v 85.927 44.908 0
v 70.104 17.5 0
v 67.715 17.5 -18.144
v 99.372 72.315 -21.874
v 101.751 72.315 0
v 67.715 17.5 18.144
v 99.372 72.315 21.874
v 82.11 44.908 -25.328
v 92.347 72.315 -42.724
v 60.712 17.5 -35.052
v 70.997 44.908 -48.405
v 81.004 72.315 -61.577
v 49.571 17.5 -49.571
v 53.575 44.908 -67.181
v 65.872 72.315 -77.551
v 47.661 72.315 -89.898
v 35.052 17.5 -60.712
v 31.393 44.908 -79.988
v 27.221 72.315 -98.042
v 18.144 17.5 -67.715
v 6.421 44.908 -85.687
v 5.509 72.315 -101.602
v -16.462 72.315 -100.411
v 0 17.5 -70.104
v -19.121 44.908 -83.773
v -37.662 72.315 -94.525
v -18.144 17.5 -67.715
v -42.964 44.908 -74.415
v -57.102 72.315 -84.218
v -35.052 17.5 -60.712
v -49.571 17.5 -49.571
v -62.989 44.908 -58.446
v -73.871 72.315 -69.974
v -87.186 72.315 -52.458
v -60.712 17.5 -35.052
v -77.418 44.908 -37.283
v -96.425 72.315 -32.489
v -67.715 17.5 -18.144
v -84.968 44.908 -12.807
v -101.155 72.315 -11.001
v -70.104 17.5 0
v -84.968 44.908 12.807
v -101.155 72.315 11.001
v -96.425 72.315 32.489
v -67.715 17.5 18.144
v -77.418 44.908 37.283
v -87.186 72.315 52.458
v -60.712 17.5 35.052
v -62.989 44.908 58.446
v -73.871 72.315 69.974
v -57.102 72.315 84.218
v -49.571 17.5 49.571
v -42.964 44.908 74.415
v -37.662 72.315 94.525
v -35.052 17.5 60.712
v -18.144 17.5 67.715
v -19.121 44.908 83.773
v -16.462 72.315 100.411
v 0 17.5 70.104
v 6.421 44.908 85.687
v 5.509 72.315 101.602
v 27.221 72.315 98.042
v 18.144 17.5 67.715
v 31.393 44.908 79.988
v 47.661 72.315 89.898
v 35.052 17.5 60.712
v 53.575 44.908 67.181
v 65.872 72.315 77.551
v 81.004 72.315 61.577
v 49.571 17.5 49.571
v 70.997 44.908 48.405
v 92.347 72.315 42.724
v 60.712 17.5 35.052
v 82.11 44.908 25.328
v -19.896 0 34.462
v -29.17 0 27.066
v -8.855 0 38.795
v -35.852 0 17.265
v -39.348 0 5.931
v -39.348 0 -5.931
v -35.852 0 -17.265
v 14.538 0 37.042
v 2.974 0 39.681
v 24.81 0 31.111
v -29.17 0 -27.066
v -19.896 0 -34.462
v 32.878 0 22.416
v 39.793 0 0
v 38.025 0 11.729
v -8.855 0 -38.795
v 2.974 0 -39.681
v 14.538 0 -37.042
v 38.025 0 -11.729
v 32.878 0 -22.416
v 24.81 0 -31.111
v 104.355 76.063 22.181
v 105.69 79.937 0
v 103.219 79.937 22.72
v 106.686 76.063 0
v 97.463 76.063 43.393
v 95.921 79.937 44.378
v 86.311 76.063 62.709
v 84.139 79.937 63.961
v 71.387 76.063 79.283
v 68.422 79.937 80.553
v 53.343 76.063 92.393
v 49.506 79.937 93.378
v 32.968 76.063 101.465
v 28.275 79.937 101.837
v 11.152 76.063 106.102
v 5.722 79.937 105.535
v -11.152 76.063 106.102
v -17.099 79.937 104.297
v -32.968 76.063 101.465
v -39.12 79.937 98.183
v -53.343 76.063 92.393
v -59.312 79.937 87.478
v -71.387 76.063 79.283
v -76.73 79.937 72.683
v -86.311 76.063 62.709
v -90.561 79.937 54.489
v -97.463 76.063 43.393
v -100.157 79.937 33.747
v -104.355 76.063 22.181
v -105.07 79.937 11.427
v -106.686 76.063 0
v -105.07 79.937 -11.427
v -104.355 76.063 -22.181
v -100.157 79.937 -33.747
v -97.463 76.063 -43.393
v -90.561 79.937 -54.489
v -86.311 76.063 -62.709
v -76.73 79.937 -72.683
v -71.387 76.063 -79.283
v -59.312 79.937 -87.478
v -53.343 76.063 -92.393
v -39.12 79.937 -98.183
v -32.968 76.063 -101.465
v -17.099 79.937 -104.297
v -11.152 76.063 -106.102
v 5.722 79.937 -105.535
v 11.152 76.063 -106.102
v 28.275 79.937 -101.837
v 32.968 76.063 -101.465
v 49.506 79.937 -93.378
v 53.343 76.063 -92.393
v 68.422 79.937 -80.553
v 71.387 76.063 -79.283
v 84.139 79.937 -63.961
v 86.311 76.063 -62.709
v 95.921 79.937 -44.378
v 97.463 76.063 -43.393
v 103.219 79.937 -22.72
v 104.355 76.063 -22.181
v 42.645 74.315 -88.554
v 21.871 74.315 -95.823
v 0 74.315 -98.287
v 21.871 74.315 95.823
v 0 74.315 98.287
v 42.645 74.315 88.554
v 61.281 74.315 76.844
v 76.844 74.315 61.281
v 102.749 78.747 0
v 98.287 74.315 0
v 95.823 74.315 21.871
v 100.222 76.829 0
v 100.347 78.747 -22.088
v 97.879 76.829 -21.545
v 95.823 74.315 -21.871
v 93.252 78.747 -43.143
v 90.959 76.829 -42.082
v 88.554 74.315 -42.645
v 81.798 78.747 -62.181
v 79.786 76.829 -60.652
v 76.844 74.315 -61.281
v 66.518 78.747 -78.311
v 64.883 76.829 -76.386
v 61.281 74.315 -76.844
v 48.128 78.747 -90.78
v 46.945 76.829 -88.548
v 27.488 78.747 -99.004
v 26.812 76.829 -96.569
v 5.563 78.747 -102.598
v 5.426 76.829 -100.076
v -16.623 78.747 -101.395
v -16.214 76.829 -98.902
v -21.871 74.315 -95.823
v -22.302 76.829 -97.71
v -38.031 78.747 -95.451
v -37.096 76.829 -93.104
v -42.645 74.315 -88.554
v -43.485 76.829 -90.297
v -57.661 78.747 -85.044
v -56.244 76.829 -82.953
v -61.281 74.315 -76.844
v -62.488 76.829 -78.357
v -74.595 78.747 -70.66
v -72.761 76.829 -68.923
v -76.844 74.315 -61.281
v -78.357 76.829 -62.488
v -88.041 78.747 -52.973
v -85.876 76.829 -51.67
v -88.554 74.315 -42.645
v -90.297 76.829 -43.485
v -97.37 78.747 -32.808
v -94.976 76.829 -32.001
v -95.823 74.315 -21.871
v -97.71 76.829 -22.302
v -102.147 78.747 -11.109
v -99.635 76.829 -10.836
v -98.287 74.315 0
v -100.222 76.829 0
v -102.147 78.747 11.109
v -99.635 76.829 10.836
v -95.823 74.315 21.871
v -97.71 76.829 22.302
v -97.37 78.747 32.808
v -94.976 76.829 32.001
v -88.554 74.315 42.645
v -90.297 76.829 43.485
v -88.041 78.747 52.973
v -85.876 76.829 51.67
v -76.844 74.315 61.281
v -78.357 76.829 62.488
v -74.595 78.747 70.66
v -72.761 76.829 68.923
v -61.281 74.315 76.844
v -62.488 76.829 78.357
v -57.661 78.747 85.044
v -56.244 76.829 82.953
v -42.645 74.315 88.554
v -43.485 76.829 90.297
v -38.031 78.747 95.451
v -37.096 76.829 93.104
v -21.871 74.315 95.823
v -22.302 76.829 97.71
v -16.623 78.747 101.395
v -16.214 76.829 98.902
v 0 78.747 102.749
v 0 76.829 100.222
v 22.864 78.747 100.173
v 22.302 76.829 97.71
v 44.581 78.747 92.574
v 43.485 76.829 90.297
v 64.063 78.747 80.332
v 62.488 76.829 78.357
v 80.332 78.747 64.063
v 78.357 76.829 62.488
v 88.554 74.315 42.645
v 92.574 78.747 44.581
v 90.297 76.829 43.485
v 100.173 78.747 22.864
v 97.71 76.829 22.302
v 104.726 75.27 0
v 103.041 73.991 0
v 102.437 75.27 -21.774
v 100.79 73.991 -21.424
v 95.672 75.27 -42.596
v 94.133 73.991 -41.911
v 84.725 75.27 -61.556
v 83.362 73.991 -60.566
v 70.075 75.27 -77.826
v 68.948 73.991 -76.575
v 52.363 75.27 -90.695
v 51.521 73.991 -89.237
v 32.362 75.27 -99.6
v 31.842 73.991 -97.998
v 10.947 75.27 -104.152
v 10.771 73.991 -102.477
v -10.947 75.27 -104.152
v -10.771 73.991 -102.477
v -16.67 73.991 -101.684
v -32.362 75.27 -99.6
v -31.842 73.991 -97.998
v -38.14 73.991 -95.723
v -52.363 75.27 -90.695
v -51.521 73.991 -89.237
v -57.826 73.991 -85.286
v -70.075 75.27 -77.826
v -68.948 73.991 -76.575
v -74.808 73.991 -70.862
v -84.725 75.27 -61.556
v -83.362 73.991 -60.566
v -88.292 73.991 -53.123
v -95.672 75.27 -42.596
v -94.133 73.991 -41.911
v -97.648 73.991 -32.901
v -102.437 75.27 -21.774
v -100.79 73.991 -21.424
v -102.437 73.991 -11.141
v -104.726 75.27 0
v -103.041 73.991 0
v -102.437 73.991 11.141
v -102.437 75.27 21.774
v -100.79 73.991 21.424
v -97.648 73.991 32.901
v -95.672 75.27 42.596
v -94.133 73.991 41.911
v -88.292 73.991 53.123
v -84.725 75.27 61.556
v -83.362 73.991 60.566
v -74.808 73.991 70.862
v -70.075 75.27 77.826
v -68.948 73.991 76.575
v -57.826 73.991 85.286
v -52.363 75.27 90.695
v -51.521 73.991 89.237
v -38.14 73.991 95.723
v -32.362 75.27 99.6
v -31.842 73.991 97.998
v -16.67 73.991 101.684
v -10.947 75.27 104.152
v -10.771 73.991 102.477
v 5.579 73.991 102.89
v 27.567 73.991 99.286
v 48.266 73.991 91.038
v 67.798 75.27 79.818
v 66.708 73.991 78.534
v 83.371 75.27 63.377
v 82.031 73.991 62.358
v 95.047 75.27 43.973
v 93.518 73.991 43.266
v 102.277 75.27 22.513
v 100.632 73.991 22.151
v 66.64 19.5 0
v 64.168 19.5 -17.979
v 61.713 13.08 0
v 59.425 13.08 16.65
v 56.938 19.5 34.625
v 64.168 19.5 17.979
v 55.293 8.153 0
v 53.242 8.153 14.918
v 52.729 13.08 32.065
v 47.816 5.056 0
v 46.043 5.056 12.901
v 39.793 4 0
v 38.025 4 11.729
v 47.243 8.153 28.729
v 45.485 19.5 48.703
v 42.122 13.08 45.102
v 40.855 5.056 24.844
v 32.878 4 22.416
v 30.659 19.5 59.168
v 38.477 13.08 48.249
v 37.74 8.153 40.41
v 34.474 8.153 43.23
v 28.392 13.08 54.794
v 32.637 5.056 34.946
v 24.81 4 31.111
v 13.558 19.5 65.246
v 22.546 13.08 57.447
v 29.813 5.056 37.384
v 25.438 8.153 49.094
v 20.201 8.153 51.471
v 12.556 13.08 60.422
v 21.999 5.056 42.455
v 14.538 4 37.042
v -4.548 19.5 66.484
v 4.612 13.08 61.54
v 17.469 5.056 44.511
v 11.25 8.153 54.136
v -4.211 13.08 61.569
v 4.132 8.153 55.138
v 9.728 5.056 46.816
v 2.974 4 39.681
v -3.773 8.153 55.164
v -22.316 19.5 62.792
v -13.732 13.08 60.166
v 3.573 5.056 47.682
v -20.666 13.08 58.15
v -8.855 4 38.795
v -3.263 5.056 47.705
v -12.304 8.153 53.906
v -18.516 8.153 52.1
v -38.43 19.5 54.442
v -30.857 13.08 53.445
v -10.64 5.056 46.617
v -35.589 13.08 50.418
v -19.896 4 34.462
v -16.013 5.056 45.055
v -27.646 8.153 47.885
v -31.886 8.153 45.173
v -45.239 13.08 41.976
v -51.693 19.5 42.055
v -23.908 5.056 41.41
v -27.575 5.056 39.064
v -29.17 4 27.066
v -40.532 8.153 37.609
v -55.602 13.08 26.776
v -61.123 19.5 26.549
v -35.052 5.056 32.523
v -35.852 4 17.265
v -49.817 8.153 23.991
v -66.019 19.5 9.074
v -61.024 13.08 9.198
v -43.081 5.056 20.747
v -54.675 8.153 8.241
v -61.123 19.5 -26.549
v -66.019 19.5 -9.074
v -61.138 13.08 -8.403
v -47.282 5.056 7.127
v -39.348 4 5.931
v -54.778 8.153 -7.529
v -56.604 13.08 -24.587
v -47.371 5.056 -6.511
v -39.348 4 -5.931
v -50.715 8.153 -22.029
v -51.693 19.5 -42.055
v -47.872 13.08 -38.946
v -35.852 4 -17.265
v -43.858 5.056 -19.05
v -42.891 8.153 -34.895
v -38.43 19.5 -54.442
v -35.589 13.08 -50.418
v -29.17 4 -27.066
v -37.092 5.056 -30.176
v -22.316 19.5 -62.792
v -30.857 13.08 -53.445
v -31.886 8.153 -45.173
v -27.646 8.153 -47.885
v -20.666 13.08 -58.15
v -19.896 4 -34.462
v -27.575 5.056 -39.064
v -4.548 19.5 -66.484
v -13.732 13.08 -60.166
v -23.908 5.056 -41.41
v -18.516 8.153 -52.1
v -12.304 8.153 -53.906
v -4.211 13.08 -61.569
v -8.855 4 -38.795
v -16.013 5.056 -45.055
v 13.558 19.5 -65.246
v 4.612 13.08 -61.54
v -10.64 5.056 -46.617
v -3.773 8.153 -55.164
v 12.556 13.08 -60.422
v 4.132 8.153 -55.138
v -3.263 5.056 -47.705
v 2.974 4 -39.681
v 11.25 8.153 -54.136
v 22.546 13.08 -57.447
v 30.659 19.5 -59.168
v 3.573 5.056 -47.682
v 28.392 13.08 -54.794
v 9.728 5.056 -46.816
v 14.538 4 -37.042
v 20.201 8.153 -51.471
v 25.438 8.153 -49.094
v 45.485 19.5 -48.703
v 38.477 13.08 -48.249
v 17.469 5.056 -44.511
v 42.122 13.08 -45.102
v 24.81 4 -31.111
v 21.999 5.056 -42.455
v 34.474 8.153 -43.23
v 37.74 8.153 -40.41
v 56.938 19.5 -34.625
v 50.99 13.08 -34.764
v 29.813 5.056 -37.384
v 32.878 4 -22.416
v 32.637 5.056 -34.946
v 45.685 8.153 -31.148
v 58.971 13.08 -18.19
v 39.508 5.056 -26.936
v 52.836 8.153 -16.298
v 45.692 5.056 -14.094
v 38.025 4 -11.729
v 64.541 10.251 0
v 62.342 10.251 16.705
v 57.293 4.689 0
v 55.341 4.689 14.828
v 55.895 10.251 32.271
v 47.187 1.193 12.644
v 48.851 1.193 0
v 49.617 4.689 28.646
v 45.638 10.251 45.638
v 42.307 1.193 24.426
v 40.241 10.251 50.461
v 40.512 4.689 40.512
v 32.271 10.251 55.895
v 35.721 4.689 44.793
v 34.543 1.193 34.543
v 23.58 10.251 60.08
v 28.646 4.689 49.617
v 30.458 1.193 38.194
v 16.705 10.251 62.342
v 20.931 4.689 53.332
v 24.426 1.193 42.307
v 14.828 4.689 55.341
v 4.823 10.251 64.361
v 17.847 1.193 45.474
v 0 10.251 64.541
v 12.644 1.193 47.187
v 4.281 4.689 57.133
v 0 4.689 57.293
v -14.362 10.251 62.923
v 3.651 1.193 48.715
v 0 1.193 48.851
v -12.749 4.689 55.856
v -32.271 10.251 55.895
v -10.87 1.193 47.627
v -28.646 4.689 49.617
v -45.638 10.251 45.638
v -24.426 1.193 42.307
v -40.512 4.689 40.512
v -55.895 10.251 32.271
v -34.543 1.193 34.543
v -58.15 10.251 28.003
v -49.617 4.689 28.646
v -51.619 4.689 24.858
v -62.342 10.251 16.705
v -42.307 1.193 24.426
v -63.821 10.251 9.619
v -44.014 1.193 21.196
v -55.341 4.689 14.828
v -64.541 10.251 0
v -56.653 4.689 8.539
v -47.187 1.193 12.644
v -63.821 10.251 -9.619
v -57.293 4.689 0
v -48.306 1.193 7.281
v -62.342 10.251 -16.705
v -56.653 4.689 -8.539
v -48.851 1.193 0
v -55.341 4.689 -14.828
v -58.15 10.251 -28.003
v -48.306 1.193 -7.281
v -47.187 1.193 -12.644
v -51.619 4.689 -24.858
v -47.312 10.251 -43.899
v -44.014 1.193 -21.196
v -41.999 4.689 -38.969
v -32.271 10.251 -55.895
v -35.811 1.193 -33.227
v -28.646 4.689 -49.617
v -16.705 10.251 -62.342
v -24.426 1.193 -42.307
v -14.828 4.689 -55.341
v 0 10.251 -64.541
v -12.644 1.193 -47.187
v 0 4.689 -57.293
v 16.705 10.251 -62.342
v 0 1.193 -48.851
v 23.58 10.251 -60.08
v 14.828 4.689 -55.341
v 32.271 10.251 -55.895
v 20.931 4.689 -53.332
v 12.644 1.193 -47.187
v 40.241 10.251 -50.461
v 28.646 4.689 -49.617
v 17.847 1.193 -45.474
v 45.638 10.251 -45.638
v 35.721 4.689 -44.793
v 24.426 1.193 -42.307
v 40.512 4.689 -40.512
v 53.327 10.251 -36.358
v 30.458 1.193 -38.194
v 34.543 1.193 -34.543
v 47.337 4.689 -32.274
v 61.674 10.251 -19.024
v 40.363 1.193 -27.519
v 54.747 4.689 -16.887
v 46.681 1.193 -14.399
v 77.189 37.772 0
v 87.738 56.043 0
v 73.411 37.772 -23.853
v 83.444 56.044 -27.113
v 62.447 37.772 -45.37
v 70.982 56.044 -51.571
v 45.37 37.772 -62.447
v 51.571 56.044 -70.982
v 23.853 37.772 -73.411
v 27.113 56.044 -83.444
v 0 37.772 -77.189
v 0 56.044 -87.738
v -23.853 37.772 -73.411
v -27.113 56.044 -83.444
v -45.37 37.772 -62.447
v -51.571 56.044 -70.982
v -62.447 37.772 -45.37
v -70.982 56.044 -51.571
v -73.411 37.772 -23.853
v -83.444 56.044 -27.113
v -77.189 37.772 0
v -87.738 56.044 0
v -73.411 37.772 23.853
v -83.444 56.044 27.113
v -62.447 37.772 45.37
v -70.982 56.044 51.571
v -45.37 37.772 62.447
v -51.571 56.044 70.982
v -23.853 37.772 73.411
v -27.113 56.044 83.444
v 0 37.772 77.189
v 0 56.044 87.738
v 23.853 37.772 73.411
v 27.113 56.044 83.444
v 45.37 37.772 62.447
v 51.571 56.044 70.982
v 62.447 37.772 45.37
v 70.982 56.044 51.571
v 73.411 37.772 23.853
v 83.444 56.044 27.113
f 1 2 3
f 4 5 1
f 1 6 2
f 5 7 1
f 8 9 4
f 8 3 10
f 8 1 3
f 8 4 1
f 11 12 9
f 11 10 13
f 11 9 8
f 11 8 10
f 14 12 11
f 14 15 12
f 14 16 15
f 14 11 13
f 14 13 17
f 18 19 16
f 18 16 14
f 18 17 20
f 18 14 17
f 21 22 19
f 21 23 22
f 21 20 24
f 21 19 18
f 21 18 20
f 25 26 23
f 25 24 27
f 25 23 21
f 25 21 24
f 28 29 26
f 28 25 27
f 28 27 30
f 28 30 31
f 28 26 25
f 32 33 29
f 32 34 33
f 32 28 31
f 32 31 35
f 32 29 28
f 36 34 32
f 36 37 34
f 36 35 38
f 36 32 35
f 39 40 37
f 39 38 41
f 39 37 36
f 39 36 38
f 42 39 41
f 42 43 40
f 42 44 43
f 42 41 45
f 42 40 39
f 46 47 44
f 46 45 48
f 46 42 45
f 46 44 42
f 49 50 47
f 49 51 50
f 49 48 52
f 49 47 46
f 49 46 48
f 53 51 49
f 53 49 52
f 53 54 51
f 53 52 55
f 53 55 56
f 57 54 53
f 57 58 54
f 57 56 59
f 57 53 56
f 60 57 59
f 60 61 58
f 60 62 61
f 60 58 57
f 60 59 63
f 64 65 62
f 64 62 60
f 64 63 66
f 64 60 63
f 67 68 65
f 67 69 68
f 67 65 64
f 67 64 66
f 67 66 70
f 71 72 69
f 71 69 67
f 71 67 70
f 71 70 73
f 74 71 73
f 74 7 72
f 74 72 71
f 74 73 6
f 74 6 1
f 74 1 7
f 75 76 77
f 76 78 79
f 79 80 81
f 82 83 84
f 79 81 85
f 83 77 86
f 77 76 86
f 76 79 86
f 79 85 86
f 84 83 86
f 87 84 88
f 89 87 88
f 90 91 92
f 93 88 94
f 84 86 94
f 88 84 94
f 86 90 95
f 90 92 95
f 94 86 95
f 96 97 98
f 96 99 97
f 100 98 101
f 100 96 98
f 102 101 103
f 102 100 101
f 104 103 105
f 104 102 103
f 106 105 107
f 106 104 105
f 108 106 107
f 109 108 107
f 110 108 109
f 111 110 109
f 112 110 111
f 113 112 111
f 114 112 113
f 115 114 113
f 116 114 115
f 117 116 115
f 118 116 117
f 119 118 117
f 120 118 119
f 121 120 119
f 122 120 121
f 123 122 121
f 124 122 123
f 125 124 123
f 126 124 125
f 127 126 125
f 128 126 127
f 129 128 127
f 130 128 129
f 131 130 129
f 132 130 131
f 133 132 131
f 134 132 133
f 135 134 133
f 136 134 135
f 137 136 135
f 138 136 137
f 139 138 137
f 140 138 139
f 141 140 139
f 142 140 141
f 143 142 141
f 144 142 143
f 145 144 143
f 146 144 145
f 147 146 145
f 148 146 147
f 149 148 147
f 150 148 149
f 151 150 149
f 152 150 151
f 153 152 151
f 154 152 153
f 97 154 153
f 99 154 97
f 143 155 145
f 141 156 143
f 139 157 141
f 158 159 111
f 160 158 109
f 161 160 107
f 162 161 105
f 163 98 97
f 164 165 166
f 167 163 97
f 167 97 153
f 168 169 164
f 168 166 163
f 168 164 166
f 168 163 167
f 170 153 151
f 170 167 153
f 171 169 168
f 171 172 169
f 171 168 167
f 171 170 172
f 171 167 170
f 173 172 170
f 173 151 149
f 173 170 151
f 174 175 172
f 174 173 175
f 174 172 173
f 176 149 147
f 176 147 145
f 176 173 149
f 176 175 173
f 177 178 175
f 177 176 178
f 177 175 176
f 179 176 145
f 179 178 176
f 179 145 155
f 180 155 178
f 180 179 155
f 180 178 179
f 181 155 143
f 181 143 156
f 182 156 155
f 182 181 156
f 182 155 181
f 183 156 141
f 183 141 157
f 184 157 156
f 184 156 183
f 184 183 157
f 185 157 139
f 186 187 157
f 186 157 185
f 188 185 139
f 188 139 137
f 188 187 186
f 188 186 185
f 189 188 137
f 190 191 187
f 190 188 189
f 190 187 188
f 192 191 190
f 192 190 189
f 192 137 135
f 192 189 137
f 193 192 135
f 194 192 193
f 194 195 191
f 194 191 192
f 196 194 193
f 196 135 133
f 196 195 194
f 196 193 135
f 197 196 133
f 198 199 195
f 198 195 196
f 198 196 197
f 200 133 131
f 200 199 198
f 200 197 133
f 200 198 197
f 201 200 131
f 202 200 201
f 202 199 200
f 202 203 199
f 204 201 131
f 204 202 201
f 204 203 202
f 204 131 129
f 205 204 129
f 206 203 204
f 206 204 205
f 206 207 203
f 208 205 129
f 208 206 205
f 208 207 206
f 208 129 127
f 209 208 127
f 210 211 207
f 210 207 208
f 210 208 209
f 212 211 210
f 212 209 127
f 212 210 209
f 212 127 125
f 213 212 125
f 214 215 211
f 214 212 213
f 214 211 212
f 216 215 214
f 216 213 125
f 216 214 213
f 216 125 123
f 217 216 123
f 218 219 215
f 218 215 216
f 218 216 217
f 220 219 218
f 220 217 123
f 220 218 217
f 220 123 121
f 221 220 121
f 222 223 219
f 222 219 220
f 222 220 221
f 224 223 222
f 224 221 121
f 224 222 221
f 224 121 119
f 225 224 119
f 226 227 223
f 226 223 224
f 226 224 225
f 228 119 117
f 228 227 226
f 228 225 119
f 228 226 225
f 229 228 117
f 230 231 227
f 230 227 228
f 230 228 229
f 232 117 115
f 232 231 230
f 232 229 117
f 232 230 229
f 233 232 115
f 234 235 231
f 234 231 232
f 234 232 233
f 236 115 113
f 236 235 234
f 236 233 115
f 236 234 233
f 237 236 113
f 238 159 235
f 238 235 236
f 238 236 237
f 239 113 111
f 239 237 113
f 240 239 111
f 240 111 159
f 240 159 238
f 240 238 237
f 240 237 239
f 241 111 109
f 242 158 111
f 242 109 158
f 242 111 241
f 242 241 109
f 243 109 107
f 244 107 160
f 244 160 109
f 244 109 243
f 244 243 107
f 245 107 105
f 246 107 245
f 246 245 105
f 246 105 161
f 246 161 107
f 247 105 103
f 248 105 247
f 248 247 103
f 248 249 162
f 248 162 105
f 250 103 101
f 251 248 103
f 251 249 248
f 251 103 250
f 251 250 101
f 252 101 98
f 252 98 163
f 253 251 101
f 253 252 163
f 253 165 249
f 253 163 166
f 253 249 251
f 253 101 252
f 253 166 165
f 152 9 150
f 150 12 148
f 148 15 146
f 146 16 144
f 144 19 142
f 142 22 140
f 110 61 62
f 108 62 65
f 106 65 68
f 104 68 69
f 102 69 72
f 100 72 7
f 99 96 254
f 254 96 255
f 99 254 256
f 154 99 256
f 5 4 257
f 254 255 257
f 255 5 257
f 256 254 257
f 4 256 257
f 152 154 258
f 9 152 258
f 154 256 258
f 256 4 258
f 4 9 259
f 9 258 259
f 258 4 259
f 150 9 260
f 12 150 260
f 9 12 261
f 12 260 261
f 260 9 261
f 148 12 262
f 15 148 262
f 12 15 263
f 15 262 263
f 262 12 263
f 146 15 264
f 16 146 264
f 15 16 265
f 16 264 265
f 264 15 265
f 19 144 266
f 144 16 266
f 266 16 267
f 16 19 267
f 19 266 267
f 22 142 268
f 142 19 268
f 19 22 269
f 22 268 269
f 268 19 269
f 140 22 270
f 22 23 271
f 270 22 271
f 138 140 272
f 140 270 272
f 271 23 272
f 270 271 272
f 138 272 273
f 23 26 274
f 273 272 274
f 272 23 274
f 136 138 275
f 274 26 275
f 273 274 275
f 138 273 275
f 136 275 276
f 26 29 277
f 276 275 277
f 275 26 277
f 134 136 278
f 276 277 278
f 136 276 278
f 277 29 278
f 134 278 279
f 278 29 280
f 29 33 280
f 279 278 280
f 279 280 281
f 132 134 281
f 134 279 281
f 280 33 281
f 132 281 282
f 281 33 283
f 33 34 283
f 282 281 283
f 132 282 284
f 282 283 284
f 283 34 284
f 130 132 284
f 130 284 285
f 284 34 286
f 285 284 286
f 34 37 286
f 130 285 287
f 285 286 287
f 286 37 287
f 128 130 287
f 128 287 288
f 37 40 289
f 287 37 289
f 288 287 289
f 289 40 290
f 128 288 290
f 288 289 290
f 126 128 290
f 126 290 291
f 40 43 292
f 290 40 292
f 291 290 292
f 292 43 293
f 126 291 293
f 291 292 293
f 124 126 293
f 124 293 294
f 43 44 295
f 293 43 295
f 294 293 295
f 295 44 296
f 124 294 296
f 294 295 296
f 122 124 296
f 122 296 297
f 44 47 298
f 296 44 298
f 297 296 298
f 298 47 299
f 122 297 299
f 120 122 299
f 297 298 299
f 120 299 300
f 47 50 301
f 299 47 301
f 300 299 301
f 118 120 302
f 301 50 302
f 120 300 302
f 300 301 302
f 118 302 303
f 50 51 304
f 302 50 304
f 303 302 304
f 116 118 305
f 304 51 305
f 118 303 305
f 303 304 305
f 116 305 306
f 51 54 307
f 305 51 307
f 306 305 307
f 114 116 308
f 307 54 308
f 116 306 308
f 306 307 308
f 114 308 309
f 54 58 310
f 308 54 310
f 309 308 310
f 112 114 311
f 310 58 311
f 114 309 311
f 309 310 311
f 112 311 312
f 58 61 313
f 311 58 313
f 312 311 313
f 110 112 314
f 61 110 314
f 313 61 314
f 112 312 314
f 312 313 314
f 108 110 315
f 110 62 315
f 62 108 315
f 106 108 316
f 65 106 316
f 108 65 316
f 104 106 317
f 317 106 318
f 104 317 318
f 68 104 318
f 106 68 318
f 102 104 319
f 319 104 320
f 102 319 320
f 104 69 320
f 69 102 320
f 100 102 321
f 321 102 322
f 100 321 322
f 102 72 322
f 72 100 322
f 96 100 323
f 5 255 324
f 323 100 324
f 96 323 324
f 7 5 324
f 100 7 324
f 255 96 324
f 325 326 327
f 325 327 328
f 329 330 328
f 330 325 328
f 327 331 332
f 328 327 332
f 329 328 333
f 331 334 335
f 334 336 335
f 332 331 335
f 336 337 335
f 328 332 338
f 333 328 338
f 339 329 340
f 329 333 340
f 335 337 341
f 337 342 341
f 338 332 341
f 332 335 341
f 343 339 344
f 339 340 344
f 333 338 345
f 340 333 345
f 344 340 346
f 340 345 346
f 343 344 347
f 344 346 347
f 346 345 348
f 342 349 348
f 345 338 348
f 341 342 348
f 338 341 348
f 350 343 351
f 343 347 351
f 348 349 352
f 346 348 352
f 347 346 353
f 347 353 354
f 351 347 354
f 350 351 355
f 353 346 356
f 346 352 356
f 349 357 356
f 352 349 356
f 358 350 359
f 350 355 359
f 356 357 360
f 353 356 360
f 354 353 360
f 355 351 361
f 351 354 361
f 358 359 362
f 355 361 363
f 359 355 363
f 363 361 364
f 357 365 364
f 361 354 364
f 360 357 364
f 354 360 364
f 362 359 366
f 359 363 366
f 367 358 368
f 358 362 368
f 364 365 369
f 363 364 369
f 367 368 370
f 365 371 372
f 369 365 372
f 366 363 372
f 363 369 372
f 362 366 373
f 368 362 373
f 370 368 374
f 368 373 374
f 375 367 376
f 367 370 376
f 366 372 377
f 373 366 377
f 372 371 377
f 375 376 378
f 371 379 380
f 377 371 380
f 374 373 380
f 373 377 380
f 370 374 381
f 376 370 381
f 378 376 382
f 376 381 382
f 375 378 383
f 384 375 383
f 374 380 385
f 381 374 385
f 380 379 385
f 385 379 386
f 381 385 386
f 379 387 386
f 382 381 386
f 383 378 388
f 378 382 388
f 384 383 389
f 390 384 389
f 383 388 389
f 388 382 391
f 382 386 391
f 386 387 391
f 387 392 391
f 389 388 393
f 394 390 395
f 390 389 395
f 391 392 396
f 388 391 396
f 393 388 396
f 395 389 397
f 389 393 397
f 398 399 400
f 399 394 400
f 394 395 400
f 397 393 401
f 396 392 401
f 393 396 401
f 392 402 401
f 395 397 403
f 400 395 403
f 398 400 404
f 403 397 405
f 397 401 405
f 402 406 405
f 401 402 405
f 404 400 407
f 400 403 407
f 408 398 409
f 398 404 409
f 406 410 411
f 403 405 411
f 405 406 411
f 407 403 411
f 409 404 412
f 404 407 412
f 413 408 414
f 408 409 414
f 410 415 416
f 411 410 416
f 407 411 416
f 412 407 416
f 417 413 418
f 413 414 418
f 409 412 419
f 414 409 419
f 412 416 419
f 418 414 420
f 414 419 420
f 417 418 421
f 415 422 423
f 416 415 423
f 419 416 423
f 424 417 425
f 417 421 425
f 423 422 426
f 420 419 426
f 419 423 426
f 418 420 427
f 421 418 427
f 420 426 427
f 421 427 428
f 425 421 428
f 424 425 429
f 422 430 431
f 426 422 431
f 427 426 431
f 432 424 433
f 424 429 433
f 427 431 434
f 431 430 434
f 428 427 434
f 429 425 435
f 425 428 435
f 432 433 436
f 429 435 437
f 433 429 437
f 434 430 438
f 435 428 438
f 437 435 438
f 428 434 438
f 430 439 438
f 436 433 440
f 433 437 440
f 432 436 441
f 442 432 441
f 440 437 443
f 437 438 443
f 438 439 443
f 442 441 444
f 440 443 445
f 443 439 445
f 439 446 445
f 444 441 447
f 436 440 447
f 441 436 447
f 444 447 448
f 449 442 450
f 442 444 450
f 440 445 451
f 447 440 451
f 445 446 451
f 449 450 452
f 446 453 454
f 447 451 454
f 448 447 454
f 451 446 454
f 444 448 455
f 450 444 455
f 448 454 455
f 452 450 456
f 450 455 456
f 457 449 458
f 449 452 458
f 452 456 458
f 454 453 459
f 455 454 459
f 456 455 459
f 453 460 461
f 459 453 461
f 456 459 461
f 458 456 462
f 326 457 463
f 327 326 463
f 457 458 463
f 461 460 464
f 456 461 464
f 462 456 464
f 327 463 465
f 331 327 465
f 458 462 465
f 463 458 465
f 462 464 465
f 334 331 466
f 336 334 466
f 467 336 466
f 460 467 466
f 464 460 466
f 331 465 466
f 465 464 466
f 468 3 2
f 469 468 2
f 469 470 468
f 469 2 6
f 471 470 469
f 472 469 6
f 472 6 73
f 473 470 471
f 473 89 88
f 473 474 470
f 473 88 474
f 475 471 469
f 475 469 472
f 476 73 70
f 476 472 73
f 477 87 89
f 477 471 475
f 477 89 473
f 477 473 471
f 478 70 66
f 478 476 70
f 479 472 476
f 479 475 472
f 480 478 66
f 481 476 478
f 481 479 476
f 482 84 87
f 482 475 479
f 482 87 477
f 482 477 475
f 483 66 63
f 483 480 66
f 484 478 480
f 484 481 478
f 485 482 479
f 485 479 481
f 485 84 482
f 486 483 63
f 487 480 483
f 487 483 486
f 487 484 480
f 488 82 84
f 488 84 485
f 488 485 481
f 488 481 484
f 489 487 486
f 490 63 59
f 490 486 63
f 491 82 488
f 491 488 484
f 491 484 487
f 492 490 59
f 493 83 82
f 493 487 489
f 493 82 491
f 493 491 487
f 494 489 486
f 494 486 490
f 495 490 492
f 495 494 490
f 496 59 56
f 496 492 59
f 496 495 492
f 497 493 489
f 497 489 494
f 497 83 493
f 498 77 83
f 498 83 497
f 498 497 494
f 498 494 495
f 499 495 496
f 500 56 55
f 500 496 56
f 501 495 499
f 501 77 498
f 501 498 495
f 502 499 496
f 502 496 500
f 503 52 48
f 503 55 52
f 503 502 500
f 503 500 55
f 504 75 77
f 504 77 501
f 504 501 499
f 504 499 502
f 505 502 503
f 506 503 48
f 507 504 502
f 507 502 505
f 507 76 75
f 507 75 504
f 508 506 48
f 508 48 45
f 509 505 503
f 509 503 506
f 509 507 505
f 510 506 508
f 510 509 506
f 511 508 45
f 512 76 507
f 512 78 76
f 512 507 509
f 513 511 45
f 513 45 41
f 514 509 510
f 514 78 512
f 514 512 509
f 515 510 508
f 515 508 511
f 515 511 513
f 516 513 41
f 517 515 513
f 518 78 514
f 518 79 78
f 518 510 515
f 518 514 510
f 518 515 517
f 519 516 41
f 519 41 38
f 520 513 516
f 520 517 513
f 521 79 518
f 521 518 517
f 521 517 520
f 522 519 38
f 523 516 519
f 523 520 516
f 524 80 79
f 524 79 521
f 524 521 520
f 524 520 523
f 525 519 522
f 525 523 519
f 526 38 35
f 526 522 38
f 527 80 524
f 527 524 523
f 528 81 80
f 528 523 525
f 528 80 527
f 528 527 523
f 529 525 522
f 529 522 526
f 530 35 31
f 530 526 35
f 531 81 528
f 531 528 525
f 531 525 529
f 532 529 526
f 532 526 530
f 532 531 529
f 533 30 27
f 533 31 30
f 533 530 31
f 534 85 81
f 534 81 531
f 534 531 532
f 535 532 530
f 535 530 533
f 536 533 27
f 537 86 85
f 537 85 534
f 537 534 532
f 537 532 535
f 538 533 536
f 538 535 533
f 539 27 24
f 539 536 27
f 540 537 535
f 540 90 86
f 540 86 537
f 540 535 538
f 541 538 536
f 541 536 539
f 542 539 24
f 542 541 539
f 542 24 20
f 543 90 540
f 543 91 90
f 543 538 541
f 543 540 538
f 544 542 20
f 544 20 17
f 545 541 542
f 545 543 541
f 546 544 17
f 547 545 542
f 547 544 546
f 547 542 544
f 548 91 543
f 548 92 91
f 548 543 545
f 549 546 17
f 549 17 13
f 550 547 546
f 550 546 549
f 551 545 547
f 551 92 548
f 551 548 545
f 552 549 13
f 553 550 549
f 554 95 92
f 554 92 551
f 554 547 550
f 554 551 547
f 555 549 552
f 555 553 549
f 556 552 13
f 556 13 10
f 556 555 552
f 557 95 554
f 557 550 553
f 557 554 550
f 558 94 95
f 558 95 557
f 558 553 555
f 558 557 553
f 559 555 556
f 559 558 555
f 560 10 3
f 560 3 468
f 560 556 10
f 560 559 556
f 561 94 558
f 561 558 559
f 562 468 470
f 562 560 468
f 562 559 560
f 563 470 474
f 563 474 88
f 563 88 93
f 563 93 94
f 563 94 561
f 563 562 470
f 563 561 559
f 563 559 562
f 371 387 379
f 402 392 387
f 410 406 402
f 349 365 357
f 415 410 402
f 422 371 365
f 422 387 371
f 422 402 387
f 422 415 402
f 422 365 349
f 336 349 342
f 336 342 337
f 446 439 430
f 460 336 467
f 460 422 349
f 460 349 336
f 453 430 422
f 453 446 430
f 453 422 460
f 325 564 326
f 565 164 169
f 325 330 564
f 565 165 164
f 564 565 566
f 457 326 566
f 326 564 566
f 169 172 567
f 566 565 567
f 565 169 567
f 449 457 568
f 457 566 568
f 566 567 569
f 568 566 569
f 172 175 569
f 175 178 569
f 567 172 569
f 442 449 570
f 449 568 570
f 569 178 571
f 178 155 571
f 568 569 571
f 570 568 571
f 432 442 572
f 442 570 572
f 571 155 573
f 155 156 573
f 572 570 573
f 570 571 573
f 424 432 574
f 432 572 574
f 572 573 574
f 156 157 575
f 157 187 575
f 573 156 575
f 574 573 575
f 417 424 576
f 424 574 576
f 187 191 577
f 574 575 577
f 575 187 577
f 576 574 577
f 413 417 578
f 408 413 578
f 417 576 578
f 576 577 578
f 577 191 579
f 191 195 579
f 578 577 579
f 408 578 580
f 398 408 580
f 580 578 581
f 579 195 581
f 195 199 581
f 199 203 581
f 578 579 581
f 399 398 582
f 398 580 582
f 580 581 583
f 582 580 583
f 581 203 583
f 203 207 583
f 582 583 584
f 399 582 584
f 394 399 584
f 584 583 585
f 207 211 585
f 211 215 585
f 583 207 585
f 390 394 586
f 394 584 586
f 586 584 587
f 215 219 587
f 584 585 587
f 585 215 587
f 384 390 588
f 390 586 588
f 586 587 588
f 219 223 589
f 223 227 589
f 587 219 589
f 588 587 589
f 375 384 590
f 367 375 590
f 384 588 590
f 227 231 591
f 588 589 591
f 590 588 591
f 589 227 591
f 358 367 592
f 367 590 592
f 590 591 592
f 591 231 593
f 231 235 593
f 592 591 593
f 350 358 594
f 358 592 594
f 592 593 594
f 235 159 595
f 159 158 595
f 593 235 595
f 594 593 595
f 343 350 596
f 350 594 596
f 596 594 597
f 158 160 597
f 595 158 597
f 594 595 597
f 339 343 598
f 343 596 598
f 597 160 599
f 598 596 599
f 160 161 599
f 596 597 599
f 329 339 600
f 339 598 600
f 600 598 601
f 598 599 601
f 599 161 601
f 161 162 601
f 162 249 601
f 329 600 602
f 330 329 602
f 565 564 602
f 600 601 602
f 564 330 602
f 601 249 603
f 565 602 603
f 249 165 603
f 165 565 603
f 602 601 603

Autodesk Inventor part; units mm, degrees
ref_plane "YZ Plane" through (0, 0, 0) normal (1, 0, 0) x (0, 1, 0)
ref_plane "XZ Plane" through (0, 0, 0) normal (0, 1, 0) x (-1, 0, 0)
ref_plane "XY Plane" through (0, 0, 0) normal (0, 0, 1) x (1, 0, 0)
sketch "Skizze1" plane through (0, 0, 0) normal (0, 0, 1) x (1, 0, 0)
  line L0 (0, 0) -> (0, 393.6564) construction
  line L1 (0, 0) -> (60, 0)
  line L2 (60, 0) -> (101.7513, 72.3153)
  line L3 (106.188, 80) -> (0, 80)
  arc A0 (106.6863, 76.0631) -> (101.7513, 72.3153) centre (108.6795, 68.3153) ccw
  arc A1 (106.6863, 76.0631) -> (106.188, 80) centre (106.188, 78) ccw
  line L4 (0, 0) -> (0, 80)
  dimension "d1" = 30
  dimension "d2" = 80
  dimension "d3" = 120
  dimension "d4" = 2
  dimension "d5" = 8
revolve "Umdrehung1" add sketch "Skizze1" angle 360 about axis through (0, 0, 0) along (0, 1, 0)
fillet "Rundung2" radius 35 1 edges at (-60, 0, 0)
shell "Wandung5" thickness 4 removed faces 2 at (6.6674, 80, -32.0854) at (-108.0747, 77.9307, -4.9241)
properties part number "Bol" material "Stahl, galvanisiert"
